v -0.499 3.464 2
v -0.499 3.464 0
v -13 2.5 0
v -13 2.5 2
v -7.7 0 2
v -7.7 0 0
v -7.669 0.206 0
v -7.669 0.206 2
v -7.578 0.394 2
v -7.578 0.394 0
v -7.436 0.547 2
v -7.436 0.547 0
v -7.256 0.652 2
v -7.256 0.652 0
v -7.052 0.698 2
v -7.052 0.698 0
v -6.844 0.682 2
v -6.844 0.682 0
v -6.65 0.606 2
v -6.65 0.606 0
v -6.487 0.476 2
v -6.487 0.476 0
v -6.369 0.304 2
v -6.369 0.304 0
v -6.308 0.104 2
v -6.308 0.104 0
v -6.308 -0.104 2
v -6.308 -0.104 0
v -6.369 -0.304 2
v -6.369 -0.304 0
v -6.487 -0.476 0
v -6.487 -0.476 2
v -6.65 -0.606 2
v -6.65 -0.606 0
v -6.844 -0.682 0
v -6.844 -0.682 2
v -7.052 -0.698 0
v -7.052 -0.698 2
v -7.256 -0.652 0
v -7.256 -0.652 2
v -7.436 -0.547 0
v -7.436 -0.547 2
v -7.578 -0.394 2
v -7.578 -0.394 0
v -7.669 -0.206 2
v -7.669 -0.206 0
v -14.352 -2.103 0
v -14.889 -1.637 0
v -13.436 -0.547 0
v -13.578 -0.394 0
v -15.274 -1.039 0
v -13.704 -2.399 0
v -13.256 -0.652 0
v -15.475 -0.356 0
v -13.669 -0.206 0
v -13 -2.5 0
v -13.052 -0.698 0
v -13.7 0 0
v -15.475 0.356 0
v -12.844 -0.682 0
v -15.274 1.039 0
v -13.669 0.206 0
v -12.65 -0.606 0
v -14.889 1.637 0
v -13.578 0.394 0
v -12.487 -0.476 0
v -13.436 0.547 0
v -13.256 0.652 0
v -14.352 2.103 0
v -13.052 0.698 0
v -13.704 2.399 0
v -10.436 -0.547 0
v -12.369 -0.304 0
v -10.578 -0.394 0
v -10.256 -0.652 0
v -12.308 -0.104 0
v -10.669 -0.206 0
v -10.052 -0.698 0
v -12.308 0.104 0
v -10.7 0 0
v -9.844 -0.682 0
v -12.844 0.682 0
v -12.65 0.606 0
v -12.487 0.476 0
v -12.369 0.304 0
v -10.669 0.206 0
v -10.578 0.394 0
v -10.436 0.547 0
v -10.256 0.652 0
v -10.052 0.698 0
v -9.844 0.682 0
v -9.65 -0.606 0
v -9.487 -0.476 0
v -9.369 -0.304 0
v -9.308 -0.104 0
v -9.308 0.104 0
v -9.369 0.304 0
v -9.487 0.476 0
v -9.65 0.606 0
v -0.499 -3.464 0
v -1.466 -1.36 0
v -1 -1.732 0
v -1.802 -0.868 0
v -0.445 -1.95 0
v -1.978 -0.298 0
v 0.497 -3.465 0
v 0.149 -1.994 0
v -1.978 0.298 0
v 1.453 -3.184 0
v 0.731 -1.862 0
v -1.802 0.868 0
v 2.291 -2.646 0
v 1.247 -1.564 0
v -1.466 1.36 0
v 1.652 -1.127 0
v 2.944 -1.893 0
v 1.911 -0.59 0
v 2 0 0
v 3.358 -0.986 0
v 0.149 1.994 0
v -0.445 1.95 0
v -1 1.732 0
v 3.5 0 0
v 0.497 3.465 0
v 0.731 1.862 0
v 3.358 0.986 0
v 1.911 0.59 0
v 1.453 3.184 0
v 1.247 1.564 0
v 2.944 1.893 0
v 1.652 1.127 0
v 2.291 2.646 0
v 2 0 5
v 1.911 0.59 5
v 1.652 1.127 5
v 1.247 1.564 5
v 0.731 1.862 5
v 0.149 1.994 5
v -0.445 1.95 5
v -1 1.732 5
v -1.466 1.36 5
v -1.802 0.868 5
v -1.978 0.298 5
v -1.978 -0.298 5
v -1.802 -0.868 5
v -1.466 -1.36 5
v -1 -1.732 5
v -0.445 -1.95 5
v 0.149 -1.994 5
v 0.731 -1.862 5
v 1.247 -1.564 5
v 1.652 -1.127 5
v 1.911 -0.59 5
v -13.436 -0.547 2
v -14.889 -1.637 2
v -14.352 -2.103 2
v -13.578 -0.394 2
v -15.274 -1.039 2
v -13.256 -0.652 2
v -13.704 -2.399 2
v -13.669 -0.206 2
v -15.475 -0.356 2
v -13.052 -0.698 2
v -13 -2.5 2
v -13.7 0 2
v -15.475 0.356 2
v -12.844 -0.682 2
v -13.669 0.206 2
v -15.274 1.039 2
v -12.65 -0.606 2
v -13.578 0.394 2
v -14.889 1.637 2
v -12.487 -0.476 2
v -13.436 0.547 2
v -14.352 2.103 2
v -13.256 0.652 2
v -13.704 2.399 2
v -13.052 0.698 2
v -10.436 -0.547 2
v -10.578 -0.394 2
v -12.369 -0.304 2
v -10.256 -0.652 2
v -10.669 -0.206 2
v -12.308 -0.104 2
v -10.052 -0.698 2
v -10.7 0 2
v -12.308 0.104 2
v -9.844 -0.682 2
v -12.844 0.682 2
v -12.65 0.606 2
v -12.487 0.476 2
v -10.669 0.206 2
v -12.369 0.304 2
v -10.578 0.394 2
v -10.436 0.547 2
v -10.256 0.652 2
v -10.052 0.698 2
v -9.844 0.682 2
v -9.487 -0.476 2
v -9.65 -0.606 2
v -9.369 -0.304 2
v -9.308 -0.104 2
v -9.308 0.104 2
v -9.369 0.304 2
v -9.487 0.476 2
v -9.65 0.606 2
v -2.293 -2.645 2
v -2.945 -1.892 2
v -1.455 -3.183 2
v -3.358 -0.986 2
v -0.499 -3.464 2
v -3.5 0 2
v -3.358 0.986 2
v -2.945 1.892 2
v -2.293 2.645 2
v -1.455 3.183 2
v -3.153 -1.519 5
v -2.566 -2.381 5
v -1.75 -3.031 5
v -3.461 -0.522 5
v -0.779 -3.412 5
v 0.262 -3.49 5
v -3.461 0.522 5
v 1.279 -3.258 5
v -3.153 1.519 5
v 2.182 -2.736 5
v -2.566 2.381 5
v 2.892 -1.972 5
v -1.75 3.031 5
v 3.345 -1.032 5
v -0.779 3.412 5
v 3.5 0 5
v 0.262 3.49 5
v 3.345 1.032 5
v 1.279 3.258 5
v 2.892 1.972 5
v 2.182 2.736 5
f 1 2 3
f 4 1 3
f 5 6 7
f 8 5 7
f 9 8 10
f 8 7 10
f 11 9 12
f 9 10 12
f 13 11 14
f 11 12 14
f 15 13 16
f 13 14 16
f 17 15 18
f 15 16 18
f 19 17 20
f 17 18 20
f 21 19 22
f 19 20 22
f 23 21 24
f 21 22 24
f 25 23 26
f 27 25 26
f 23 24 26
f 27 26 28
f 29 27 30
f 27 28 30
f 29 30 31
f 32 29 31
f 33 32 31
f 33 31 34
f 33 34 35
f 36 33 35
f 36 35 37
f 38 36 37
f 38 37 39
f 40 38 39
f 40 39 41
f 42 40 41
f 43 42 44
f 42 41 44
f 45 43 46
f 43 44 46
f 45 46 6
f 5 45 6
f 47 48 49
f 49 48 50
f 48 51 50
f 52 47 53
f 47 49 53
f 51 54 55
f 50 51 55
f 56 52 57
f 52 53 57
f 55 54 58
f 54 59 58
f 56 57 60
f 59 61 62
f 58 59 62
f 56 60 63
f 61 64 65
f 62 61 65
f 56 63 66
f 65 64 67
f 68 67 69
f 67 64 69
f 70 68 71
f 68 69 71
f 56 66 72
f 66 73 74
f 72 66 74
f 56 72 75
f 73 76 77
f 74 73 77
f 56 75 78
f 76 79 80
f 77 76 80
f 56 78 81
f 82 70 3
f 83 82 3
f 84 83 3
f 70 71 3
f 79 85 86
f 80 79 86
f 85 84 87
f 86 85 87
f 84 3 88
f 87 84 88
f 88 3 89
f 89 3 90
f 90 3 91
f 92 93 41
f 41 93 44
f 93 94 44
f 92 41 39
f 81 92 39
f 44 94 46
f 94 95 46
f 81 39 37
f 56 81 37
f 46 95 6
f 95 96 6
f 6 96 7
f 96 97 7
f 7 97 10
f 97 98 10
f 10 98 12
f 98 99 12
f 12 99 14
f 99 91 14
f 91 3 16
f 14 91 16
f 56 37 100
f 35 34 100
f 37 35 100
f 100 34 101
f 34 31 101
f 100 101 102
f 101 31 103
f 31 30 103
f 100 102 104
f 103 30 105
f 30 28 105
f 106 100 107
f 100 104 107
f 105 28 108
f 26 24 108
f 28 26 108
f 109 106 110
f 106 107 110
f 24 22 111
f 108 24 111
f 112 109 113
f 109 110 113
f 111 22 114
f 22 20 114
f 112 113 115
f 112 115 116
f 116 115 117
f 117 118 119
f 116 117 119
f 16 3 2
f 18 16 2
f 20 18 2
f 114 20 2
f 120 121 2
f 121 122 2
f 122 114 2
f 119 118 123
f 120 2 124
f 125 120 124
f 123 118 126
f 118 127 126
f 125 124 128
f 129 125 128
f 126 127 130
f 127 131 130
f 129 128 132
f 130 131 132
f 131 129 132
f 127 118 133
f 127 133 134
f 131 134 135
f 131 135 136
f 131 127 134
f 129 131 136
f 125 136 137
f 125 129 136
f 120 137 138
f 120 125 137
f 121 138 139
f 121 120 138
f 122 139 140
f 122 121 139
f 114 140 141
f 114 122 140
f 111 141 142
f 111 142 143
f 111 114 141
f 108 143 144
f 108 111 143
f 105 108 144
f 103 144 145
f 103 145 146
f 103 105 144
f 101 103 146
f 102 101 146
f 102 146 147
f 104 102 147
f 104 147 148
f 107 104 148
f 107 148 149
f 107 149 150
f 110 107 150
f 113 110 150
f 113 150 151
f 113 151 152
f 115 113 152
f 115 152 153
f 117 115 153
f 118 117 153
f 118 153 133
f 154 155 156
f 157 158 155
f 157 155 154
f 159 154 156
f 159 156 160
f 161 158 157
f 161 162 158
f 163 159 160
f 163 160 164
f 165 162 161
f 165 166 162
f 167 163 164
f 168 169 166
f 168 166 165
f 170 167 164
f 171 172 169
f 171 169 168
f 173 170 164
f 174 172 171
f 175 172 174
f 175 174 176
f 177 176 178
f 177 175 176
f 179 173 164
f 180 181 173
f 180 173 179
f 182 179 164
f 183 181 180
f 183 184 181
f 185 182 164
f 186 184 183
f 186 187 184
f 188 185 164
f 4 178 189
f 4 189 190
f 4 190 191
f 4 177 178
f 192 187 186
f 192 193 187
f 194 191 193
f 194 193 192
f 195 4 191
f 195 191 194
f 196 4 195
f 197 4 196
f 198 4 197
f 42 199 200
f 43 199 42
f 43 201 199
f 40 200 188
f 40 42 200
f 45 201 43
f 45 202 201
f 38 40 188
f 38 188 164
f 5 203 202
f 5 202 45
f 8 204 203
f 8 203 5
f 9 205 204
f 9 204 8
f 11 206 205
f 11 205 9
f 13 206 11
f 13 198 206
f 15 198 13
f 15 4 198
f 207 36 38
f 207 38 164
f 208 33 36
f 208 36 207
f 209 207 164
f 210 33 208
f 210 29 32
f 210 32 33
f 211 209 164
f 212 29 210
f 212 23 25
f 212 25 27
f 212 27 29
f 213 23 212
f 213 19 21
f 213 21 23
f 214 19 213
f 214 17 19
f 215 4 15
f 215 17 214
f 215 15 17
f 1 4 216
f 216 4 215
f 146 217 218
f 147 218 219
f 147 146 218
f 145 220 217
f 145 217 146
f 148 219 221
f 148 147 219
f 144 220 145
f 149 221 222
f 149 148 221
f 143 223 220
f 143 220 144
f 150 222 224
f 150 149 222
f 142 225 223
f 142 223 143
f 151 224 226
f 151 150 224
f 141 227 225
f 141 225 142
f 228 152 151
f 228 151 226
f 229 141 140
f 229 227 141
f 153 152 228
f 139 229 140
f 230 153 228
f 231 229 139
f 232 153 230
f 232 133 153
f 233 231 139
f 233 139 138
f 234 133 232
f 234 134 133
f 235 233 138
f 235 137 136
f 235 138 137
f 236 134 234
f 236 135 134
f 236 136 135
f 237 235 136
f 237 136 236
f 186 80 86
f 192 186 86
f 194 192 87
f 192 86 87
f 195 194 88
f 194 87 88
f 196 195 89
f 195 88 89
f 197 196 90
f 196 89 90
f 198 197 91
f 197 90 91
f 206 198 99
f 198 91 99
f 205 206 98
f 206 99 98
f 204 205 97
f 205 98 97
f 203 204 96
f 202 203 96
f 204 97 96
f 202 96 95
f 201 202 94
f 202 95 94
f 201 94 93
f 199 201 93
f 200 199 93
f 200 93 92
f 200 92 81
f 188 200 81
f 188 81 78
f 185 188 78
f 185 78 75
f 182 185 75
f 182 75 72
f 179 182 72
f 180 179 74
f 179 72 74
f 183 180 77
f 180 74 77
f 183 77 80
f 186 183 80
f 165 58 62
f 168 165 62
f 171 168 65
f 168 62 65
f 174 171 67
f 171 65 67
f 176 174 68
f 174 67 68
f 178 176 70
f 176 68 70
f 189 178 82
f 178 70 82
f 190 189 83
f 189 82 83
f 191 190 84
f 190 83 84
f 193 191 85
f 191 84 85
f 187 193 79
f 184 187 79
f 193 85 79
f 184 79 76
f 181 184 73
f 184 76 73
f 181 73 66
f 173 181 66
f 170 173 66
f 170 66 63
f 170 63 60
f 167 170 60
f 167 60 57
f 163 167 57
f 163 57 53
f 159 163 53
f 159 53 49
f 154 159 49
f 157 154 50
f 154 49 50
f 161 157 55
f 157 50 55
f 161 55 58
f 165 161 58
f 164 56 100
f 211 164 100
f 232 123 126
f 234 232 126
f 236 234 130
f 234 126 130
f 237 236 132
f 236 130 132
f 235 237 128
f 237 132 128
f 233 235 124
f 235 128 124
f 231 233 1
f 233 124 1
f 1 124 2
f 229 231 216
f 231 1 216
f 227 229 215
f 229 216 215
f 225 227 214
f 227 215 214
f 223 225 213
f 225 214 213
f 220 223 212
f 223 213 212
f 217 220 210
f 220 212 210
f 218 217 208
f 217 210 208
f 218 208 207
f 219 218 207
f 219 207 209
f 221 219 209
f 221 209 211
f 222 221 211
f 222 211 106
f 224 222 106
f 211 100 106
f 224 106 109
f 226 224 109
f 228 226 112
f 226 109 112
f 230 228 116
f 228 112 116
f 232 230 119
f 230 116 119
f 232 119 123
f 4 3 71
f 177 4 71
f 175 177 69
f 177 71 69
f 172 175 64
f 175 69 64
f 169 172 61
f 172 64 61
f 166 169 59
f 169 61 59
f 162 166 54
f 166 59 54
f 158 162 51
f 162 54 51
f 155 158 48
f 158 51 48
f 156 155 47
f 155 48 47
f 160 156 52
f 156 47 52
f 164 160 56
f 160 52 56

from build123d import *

# Parameters (mm, degrees)
SKETCH1_R           = 3.5
SKETCH1_R_2         = 2
BOSS_EXTRUDE1_DEPTH = 5
SKETCH2_R           = 2
SKETCH2_R_2         = 0.7
BOSS_EXTRUDE2_DEPTH = 2


with BuildPart() as part:
    # Sketch1 → Boss-Extrude1 (new body)
    with BuildSketch(Plane.XY):
        Circle(SKETCH1_R)
        Circle(SKETCH1_R_2, mode=Mode.SUBTRACT)
    extrude(amount=BOSS_EXTRUDE1_DEPTH)

    # Sketch2 → Boss-Extrude2 (add)
    with BuildSketch(Plane(origin=(0, 0, 0), x_dir=(-1, 0, 0), z_dir=(0, 0, -1))):
        with BuildLine():
            Line((0.499445817, 3.464181559), (13, 2.5))
            ThreePointArc((13, 2.5), (15.5, 0), (13, -2.5))
            Line((13, -2.5), (0.499445817, -3.464181559))
            ThreePointArc((0.499445817, -3.464181559), (-3.5, 0), (0.499445817, 3.464181559))
        make_face()
        with Locations(Location((0, 0, 0), (0, 0, 180))):
            Circle(SKETCH2_R, mode=Mode.SUBTRACT)
        with Locations((7, 0)):
            Circle(SKETCH2_R_2, mode=Mode.SUBTRACT)
        with Locations((10, 0)):
            Circle(SKETCH2_R_2, mode=Mode.SUBTRACT)
        with Locations((13, 0)):
            Circle(SKETCH2_R_2, mode=Mode.SUBTRACT)
    extrude(amount=-BOSS_EXTRUDE2_DEPTH)


solid = part.part
